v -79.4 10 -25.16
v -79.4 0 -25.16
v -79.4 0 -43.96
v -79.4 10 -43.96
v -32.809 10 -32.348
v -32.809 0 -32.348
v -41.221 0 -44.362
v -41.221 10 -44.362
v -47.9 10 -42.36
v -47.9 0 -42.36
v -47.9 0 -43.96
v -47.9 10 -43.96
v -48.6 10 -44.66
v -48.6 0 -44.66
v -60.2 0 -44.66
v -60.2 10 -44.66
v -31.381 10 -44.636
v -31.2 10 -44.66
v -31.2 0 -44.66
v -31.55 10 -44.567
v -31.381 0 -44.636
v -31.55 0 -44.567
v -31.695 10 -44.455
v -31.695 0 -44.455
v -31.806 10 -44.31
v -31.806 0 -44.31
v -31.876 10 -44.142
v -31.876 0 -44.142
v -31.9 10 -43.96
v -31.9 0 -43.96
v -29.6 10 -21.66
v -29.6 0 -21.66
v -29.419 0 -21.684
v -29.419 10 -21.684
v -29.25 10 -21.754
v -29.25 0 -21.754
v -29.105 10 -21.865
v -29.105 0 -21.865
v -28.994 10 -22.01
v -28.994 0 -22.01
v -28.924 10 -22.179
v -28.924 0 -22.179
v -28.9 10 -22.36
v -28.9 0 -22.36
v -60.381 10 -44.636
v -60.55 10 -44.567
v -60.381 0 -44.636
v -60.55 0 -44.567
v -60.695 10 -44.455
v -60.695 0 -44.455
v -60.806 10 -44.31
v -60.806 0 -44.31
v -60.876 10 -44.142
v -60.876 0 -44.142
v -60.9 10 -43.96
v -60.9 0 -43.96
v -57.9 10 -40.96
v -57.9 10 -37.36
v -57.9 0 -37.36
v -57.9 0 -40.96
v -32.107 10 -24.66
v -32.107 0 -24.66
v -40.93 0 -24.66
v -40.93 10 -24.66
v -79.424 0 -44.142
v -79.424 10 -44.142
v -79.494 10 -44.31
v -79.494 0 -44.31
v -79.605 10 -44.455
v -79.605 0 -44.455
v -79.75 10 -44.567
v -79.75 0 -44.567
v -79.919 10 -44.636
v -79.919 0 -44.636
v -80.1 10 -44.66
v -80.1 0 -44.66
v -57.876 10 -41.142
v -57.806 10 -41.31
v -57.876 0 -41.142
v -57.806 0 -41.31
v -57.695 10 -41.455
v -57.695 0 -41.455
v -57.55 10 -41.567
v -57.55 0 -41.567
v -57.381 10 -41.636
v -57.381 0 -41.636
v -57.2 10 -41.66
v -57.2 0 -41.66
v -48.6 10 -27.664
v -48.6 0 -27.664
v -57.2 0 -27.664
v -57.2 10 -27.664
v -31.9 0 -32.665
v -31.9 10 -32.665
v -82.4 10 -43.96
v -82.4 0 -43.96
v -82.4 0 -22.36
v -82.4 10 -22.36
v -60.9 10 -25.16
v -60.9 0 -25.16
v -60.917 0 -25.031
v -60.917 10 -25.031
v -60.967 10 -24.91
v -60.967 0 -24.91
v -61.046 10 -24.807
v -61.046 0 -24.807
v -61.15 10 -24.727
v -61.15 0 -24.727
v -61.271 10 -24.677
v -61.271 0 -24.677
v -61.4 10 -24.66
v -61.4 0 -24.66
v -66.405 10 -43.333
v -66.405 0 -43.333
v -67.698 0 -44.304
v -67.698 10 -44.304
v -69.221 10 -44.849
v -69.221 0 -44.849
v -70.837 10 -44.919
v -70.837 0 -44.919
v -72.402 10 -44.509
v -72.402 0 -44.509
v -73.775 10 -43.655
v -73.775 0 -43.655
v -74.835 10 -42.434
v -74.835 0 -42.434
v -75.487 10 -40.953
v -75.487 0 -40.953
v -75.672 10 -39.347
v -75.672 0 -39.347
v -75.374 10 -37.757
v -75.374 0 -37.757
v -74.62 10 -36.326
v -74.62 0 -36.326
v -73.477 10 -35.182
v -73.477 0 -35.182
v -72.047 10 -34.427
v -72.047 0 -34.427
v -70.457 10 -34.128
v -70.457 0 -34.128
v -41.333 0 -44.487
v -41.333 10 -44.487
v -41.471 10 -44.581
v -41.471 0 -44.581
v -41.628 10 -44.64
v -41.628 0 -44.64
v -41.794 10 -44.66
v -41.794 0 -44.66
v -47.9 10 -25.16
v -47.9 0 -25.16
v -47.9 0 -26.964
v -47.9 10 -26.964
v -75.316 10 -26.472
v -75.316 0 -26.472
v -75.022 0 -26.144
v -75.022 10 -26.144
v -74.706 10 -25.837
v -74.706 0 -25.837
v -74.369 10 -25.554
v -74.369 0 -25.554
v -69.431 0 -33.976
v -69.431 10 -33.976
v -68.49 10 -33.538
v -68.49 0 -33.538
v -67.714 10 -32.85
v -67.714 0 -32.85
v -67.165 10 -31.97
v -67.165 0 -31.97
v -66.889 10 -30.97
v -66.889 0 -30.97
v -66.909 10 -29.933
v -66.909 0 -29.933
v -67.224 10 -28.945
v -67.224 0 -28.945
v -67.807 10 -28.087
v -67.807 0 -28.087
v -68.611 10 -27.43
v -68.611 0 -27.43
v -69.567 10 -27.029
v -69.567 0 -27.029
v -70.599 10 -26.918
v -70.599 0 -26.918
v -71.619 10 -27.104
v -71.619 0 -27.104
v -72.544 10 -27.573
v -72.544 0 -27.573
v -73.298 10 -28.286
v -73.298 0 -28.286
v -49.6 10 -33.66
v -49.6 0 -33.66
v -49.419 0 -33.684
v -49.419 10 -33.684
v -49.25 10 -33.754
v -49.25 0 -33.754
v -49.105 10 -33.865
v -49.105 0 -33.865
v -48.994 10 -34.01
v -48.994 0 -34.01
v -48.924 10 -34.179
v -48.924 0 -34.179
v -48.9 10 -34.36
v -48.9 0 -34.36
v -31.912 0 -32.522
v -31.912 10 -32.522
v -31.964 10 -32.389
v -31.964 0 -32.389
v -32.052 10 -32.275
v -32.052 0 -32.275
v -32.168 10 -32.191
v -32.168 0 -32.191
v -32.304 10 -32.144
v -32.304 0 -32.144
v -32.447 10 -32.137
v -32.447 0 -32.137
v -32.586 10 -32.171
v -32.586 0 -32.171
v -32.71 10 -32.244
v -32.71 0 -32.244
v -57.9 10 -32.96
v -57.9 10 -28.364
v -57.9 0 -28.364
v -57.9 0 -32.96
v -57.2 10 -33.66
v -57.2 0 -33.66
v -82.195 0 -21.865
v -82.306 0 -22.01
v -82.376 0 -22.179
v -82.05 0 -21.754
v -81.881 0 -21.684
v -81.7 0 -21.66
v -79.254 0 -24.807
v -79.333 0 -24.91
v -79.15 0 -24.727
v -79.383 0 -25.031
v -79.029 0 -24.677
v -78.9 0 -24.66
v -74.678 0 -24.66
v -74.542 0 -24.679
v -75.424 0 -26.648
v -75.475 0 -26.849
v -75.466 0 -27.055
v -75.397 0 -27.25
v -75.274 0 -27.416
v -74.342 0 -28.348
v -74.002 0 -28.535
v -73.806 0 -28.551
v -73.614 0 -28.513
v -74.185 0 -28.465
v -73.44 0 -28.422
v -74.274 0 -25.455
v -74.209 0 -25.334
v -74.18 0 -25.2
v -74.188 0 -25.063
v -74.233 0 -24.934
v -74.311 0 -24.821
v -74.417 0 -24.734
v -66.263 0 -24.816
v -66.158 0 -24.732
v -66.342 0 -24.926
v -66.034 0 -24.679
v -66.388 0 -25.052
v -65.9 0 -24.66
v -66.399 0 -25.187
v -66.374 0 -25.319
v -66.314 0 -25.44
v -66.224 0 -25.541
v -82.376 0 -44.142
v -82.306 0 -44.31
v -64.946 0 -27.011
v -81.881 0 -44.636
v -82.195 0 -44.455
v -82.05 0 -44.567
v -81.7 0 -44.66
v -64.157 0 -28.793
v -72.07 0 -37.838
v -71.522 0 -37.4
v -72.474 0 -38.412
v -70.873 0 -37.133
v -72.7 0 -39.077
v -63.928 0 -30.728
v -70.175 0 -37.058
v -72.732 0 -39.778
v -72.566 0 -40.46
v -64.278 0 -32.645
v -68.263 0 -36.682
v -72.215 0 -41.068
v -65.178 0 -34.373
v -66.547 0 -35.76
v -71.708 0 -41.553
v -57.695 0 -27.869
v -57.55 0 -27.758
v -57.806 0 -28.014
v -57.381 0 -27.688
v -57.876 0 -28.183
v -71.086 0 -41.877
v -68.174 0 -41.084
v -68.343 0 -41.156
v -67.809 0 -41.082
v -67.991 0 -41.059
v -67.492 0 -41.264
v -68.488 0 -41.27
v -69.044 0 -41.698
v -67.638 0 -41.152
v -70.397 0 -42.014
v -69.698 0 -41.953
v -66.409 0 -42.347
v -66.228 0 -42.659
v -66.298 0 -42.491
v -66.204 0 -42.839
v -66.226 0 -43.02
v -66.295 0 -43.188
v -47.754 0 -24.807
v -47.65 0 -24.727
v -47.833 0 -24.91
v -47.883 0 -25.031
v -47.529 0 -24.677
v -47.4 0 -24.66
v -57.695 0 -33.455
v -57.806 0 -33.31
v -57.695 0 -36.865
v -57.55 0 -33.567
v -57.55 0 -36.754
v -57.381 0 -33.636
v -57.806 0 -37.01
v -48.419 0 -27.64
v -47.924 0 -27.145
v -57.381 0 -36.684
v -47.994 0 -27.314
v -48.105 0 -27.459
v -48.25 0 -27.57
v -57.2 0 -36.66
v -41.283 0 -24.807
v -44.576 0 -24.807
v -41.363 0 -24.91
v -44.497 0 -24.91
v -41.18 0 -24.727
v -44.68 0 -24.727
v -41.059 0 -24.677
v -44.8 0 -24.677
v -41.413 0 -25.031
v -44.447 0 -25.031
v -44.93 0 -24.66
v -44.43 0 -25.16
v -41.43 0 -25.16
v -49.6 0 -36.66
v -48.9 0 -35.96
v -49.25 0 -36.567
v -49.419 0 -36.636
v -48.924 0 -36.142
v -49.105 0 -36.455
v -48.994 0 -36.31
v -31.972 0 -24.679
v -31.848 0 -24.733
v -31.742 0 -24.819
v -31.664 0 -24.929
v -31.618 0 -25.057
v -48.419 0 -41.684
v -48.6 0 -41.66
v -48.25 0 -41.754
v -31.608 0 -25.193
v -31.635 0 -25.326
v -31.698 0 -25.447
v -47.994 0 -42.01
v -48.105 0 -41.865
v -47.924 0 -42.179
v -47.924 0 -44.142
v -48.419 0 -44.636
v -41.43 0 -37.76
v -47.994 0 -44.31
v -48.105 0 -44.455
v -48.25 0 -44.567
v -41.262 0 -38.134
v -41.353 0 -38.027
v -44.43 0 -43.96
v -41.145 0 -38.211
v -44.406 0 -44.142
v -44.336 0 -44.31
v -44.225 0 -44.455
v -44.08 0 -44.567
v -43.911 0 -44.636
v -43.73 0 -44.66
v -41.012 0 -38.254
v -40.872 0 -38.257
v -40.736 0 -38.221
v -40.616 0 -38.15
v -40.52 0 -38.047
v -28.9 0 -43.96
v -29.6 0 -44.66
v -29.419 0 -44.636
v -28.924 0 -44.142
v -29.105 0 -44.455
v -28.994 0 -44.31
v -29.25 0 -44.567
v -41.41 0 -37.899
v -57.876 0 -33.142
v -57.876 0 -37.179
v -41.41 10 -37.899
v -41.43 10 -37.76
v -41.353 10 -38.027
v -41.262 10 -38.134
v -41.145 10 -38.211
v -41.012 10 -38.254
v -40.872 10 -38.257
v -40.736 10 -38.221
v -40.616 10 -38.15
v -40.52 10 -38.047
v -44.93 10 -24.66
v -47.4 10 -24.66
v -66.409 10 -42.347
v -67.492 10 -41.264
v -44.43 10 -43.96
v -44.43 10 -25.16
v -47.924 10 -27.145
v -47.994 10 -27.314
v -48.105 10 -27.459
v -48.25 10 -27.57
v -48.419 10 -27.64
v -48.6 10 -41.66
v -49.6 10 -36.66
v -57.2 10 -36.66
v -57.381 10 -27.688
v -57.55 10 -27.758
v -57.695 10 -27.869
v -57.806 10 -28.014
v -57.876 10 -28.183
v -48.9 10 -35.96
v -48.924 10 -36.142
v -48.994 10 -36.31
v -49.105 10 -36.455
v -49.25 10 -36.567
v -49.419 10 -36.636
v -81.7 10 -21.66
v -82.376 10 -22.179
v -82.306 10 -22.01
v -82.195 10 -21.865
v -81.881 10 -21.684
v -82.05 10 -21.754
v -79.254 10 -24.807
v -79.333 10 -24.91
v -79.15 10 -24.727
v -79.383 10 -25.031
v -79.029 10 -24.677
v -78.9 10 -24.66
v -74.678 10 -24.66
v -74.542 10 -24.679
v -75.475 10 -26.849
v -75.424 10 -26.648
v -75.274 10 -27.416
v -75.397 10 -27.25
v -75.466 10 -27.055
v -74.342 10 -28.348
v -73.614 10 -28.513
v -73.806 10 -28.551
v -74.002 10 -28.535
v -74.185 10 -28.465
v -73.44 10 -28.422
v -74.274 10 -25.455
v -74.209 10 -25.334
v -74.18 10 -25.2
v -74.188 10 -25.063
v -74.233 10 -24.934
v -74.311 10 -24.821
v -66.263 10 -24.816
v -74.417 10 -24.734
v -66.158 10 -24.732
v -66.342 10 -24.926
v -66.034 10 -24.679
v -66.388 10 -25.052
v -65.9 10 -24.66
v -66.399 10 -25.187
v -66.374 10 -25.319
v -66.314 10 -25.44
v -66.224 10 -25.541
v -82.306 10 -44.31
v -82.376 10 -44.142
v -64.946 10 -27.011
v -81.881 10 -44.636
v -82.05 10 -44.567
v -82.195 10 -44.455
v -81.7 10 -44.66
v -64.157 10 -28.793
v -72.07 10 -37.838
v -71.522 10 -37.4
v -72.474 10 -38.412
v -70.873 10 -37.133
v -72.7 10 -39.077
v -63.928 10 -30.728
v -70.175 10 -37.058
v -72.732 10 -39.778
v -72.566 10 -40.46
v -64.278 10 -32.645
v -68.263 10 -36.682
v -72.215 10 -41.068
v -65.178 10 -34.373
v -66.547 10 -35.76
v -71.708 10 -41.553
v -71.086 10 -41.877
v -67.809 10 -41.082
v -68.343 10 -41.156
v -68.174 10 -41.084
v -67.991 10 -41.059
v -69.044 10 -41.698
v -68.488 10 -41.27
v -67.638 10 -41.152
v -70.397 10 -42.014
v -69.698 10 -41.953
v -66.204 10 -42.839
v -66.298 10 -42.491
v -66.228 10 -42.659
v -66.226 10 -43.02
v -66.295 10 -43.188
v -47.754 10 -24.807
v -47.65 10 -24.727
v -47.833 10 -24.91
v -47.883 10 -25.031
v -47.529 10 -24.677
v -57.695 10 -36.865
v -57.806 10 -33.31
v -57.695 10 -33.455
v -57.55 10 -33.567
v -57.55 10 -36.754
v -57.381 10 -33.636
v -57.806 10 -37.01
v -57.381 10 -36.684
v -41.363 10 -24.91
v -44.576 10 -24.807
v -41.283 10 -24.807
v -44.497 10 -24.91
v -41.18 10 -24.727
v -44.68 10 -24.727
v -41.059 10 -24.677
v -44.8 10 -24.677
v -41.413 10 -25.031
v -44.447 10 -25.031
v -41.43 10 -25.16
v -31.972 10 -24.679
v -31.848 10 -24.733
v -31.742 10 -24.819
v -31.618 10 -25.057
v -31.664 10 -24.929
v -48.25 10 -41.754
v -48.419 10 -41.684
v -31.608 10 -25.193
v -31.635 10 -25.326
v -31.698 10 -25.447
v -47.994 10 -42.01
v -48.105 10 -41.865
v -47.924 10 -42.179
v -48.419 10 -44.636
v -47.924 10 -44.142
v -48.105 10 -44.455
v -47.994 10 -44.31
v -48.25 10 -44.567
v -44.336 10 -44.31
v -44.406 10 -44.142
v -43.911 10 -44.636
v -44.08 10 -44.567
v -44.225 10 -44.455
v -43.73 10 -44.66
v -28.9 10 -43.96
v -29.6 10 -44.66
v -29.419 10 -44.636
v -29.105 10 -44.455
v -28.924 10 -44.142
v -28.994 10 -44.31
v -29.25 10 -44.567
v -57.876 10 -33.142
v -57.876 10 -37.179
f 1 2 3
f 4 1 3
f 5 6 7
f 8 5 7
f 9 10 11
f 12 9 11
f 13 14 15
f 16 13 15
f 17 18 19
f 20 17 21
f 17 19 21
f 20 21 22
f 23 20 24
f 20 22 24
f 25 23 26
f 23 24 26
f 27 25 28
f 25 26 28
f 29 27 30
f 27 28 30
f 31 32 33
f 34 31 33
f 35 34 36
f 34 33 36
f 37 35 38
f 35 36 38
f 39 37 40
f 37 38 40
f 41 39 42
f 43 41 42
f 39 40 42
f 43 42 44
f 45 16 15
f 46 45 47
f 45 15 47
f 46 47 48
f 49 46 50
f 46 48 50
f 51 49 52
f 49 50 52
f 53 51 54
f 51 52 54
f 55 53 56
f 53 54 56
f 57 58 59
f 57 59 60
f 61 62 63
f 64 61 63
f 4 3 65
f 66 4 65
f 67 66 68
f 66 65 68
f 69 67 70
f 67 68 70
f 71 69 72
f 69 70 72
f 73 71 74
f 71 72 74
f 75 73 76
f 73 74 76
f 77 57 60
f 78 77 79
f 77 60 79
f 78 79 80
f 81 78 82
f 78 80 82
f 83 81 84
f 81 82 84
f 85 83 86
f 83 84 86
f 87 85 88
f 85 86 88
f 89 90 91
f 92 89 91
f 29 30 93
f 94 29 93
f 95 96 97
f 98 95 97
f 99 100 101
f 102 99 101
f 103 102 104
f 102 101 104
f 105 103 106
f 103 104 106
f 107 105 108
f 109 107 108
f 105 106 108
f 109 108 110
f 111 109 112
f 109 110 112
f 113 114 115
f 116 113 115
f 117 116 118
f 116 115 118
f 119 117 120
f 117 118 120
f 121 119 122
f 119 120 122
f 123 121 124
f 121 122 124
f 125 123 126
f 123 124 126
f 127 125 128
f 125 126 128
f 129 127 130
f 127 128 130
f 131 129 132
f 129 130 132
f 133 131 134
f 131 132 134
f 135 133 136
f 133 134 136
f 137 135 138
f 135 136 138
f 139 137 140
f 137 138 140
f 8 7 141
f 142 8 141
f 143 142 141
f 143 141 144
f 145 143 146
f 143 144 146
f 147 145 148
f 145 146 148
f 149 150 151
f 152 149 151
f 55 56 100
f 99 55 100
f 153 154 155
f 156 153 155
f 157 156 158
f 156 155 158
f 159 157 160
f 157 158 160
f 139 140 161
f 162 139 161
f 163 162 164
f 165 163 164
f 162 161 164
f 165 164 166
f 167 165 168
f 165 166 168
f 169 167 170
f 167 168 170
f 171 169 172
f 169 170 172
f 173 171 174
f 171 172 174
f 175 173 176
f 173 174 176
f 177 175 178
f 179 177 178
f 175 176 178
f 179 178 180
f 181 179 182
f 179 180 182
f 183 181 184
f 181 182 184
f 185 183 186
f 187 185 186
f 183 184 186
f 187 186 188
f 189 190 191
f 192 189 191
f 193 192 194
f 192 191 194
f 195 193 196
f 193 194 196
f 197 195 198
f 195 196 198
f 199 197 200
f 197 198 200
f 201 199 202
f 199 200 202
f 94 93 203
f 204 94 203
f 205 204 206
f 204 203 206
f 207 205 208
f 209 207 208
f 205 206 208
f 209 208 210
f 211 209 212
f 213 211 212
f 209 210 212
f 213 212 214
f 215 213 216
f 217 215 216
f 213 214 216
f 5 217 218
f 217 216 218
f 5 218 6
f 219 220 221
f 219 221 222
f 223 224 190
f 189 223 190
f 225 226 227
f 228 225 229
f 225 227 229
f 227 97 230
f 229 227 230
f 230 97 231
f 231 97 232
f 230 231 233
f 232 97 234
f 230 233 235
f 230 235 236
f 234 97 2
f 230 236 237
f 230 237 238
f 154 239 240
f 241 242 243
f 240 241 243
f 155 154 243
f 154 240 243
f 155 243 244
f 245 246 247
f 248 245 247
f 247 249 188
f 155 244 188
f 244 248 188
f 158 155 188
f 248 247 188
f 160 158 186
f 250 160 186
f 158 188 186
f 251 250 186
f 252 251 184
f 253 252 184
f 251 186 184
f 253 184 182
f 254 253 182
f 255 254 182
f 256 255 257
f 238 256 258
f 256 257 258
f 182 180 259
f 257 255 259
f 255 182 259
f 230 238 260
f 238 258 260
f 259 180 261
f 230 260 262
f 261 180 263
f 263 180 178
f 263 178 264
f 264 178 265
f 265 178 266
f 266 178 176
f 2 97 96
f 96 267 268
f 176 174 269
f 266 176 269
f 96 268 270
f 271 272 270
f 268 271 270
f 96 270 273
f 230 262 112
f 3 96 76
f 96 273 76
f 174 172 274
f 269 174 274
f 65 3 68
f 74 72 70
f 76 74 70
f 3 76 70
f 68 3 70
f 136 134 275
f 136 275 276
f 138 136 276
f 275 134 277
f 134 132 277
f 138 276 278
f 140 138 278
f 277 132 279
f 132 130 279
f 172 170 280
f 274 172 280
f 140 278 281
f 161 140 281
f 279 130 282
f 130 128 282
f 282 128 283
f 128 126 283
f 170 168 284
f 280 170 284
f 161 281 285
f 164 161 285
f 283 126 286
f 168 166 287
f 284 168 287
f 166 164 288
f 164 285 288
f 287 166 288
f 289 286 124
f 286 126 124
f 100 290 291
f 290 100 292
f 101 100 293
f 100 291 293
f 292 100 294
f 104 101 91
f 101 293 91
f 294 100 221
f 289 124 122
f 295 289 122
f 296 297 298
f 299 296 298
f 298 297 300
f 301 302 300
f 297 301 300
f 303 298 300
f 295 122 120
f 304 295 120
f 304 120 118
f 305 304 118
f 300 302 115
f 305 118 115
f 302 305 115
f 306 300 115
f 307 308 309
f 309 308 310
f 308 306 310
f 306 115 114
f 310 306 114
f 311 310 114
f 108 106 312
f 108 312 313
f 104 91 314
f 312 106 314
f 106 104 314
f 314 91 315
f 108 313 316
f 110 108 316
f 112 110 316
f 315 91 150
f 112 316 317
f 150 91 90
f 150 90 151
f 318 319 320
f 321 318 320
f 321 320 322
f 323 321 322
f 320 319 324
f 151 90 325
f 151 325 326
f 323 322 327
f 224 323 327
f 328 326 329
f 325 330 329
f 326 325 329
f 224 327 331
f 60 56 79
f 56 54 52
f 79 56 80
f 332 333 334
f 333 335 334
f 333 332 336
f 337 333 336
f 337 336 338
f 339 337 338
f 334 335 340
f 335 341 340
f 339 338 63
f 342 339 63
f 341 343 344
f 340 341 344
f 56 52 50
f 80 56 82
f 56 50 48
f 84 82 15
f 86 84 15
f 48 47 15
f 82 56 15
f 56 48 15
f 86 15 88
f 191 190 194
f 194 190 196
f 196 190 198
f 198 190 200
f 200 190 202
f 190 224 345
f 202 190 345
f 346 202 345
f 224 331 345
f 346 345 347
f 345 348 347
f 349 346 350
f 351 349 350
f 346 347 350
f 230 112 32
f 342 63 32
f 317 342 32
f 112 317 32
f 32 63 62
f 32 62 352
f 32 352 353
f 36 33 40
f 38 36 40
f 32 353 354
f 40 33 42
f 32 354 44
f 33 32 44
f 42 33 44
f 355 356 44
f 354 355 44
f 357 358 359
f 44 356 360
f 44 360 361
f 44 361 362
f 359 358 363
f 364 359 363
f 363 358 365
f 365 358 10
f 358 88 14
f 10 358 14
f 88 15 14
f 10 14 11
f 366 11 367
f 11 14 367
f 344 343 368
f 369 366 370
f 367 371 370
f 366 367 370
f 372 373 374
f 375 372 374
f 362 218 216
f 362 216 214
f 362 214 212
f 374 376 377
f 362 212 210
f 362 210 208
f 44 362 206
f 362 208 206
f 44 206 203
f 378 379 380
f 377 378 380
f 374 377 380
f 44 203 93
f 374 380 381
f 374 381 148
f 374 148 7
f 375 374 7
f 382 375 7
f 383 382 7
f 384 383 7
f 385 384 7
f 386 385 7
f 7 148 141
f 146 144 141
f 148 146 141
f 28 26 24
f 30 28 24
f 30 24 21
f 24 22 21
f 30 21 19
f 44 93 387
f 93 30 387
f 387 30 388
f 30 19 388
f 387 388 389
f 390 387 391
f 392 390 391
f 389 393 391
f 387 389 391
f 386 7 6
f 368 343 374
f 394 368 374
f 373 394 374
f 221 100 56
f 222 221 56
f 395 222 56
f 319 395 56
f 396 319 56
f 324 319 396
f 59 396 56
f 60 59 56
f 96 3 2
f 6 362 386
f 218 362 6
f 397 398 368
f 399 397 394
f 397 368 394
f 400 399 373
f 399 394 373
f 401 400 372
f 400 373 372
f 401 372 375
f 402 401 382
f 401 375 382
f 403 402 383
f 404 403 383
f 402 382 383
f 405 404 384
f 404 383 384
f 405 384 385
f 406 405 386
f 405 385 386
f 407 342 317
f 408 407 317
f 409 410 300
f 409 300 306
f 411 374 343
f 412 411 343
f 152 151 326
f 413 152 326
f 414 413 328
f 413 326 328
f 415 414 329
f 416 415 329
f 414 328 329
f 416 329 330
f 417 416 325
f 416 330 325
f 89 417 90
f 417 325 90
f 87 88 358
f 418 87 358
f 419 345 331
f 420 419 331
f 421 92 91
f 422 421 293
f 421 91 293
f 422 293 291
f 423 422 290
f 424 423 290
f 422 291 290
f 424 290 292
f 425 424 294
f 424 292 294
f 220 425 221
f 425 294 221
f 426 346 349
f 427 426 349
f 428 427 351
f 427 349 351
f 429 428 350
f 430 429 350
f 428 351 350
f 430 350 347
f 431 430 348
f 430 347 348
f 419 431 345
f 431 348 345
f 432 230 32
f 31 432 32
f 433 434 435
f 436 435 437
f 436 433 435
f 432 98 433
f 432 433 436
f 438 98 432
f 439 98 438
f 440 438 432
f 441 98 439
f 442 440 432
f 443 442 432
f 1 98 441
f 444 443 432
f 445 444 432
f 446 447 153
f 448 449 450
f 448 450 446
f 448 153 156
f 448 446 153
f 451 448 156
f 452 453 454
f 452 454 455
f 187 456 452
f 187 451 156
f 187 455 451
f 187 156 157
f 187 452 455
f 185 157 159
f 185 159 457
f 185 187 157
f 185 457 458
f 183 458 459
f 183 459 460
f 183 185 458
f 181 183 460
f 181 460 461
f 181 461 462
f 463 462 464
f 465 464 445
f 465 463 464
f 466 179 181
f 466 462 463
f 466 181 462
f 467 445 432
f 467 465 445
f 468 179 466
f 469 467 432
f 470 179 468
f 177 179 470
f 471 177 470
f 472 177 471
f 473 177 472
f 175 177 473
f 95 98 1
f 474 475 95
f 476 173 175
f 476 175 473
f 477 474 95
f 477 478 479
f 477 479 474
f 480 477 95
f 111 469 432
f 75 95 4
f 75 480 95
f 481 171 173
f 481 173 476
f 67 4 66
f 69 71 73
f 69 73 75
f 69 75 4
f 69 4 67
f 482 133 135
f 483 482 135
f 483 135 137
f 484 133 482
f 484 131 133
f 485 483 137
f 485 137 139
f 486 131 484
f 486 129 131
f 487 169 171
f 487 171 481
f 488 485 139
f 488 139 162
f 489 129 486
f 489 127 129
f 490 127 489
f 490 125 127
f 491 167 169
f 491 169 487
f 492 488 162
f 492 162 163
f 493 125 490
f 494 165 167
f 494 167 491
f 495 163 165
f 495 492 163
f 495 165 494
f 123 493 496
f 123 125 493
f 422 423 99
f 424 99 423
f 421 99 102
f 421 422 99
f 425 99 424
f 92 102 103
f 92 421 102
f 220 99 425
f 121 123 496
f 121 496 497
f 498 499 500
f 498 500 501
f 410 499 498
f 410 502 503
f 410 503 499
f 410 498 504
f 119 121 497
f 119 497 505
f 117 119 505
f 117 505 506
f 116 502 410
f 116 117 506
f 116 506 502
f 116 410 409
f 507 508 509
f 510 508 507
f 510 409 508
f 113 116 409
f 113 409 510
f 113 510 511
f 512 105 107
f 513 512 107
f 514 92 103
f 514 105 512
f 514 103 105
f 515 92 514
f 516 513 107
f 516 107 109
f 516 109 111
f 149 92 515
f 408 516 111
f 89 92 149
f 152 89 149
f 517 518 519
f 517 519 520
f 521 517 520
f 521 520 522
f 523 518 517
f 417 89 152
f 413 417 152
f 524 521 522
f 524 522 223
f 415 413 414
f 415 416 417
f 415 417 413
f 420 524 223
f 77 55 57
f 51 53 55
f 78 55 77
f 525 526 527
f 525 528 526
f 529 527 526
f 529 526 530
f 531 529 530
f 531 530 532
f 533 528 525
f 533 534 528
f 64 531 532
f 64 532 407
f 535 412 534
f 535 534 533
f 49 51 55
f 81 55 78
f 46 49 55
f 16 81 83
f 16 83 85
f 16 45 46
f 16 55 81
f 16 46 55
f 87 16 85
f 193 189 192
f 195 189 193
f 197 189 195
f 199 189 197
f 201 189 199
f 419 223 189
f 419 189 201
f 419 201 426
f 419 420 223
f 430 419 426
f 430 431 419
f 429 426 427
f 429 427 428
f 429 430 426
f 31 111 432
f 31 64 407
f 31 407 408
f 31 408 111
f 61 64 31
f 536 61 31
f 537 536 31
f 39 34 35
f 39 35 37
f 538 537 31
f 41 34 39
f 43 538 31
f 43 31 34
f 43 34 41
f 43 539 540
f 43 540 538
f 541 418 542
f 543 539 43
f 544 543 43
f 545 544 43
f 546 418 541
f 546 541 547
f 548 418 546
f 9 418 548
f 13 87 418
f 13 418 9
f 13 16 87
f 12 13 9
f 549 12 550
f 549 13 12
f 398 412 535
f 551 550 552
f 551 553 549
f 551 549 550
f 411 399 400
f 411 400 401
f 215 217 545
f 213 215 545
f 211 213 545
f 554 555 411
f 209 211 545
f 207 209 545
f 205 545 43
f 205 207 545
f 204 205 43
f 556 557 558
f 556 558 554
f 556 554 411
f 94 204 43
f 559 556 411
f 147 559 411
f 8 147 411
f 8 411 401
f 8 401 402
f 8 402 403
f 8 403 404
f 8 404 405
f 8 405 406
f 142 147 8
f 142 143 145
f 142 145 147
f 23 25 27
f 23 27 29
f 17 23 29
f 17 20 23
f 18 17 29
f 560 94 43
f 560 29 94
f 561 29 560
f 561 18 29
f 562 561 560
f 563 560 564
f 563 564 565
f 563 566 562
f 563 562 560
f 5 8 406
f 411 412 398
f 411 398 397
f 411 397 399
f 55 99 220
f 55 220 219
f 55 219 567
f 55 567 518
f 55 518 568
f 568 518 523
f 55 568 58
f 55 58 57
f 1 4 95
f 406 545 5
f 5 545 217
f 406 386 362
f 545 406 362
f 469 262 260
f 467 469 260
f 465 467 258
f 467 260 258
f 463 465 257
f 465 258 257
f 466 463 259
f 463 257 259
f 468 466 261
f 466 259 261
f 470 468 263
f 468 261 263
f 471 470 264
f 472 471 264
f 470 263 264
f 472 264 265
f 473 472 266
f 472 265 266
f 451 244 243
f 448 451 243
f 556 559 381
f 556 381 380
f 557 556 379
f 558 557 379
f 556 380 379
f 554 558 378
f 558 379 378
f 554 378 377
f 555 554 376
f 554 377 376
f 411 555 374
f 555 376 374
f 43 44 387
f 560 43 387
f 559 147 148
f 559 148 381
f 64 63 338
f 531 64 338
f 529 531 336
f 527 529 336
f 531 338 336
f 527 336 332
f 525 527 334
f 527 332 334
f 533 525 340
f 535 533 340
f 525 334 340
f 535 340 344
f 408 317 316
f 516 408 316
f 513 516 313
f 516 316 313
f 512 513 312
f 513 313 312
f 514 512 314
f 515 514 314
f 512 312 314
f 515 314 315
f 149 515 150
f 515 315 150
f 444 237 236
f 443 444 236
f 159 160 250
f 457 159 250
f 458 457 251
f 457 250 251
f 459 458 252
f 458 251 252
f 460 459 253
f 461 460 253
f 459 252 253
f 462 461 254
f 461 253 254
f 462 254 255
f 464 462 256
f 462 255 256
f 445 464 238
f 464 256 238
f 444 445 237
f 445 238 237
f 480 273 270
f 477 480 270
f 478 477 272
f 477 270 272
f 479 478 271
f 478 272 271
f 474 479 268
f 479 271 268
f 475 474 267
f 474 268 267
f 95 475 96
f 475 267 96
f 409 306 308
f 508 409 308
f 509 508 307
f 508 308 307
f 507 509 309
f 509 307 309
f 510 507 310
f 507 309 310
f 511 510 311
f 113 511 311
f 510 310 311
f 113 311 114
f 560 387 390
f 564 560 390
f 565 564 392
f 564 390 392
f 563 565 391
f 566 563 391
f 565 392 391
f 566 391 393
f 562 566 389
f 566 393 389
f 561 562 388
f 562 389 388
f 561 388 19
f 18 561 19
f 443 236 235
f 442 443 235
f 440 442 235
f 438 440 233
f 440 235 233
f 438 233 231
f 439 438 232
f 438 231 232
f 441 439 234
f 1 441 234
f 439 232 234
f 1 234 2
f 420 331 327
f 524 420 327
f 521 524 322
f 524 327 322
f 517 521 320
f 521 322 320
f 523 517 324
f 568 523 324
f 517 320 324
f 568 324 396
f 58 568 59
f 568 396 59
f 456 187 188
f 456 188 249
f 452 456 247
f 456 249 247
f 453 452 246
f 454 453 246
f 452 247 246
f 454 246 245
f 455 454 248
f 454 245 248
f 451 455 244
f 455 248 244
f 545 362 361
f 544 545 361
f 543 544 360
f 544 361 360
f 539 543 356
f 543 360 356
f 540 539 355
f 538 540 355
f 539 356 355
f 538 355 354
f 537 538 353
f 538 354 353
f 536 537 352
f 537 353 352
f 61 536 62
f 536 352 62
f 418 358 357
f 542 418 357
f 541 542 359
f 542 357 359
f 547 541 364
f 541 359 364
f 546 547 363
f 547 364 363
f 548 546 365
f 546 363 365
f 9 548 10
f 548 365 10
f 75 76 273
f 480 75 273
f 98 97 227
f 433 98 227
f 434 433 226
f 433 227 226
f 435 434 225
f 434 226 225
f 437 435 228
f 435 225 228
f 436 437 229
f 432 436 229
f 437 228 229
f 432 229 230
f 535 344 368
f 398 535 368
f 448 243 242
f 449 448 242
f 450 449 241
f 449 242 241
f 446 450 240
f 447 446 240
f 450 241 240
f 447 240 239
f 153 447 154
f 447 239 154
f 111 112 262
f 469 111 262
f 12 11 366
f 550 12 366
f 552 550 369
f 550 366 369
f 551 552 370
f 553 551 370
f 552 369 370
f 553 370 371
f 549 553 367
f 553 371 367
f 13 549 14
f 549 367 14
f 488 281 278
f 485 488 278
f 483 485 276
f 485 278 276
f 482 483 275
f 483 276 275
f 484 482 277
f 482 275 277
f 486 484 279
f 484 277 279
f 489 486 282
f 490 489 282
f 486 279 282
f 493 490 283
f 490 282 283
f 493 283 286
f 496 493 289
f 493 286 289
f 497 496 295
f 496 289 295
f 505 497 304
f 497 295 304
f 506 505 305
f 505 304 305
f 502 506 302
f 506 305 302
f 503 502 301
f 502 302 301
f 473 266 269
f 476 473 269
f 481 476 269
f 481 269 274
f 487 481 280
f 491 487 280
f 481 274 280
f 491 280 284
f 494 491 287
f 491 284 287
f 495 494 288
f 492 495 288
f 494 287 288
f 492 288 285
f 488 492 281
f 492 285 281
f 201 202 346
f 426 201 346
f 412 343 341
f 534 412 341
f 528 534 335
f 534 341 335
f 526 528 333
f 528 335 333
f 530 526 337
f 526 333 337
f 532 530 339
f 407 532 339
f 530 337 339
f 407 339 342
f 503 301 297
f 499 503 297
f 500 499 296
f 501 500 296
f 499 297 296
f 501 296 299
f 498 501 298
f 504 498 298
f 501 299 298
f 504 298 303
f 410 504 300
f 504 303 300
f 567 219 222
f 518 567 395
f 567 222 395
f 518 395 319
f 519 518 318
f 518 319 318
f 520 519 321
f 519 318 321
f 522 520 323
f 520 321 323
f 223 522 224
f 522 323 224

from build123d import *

# Parameters (mm, degrees)
BOSS_EXTRU_1_DEPTH = 10


with BuildPart() as part:
    # Esquisse3 → Boss.-Extru.1 (new body)
    with BuildSketch(Plane(origin=(0, 0, 0), x_dir=(1, 0, 0), z_dir=(0, 1, 0))):
        with BuildLine():
            Line((-82.4, 43.960350299), (-82.4, 24.660350299))
            Line((-82.4, 24.660350299), (-82.4, 22.360350299))
            ThreePointArc((-82.4, 22.360350299), (-82.194974747, 21.865375552), (-81.7, 21.660350299))
            Line((-81.7, 21.660350299), (-29.6, 21.660350299))
            ThreePointArc((-29.6, 21.660350299), (-29.105025253, 21.865375552), (-28.9, 22.360350299))
            Line((-28.9, 22.360350299), (-28.9, 24.660350299))
            Line((-28.9, 24.660350299), (-28.9, 43.960350299))
            ThreePointArc((-28.9, 43.960350299), (-29.105025253, 44.455325045), (-29.6, 44.660350299))
            Line((-29.6, 44.660350299), (-31.2, 44.660350299))
            ThreePointArc((-31.2, 44.660350299), (-31.694974747, 44.455325045), (-31.9, 43.960350299))
            Line((-31.9, 43.960350299), (-31.9, 32.665451753))
            ThreePointArc((-31.9, 32.665451753), (-32.234265531, 32.16295091), (-32.808648392, 32.348220639))
            Line((-32.808648392, 32.348220639), (-41.220684895, 44.361853804))
            ThreePointArc((-41.220684895, 44.361853804), (-41.470867297, 44.581257882), (-41.794091326, 44.660350299))
            Line((-41.794091326, 44.660350299), (-43.729694391, 44.660350299))
            ThreePointArc((-43.729694391, 44.660350299), (-44.224669138, 44.455325045), (-44.429694391, 43.960350299))
            Line((-44.429694391, 43.960350299), (-44.429694391, 25.160350299))
            ThreePointArc((-44.429694391, 25.160350299), (-44.576141, 24.806796908), (-44.929694391, 24.660350299))
            Line((-44.929694391, 24.660350299), (-47.4, 24.660350299))
            ThreePointArc((-47.4, 24.660350299), (-47.753553391, 24.806796908), (-47.9, 25.160350299))
            Line((-47.9, 25.160350299), (-47.9, 26.96406145))
            ThreePointArc((-47.9, 26.96406145), (-48.105025253, 27.459036196), (-48.6, 27.66406145))
            Line((-48.6, 27.66406145), (-57.2, 27.66406145))
            ThreePointArc((-57.2, 27.66406145), (-57.694974747, 27.869086703), (-57.9, 28.36406145))
            Line((-57.9, 28.36406145), (-57.9, 32.960350299))
            ThreePointArc((-57.9, 32.960350299), (-57.694974747, 33.455325045), (-57.2, 33.660350299))
            Line((-57.2, 33.660350299), (-49.6, 33.660350299))
            ThreePointArc((-49.6, 33.660350299), (-49.105025253, 33.865375552), (-48.9, 34.360350299))
            Line((-48.9, 34.360350299), (-48.9, 35.960350299))
            ThreePointArc((-48.9, 35.960350299), (-49.105025253, 36.455325045), (-49.6, 36.660350299))
            Line((-49.6, 36.660350299), (-57.2, 36.660350299))
            ThreePointArc((-57.2, 36.660350299), (-57.694974747, 36.865375552), (-57.9, 37.360350299))
            Line((-57.9, 37.360350299), (-57.9, 40.960350299))
            ThreePointArc((-57.9, 40.960350299), (-57.694974747, 41.455325045), (-57.2, 41.660350299))
            Line((-57.2, 41.660350299), (-48.6, 41.660350299))
            ThreePointArc((-48.6, 41.660350299), (-48.105025253, 41.865375552), (-47.9, 42.360350299))
            Line((-47.9, 42.360350299), (-47.9, 43.960350299))
            ThreePointArc((-47.9, 43.960350299), (-48.105025253, 44.455325045), (-48.6, 44.660350299))
            Line((-48.6, 44.660350299), (-60.2, 44.660350299))
            ThreePointArc((-60.2, 44.660350299), (-60.694974747, 44.455325045), (-60.9, 43.960350299))
            Line((-60.9, 43.960350299), (-60.9, 25.160350299))
            ThreePointArc((-60.9, 25.160350299), (-61.046446609, 24.806796908), (-61.4, 24.660350299))
            Line((-61.4, 24.660350299), (-65.9, 24.660350299))
            ThreePointArc((-65.9, 24.660350299), (-66.369202757, 24.987582324), (-66.224252839, 25.540955207))
            ThreePointArc((-66.224252839, 25.540955207), (-64.278360769, 32.64470583), (-70.174954097, 37.058316142))
            ThreePointArc((-70.174954097, 37.058316142), (-72.565676109, 40.459645131), (-68.487924516, 41.269912109))
            ThreePointArc((-68.487924516, 41.269912109), (-67.991231434, 41.058872606), (-67.492020465, 41.26388504))
            Line((-67.492020465, 41.26388504), (-66.408605494, 42.347300011))
            ThreePointArc((-66.408605494, 42.347300011), (-66.203586079, 42.839415787), (-66.404578845, 43.333189829))
            ThreePointArc((-66.404578845, 43.333189829), (-75.216844977, 41.718134484), (-70.456992958, 34.128124806))
            ThreePointArc((-70.456992958, 34.128124806), (-67.224229351, 28.944517523), (-73.29773035, 28.286390935))
            ThreePointArc((-73.29773035, 28.286390935), (-73.806166505, 28.551332862), (-74.342034946, 28.347503126))
            Line((-74.342034946, 28.347503126), (-75.273738539, 27.415799533))
            ThreePointArc((-75.273738539, 27.415799533), (-75.478062353, 26.95215404), (-75.316017422, 26.472094871))
            ThreePointArc((-75.316017422, 26.472094871), (-74.866763267, 25.988060793), (-74.369432688, 25.55357192))
            ThreePointArc((-74.369432688, 25.55357192), (-74.205711949, 24.996965493), (-74.678263963, 24.660350299))
            Line((-74.678263963, 24.660350299), (-78.9, 24.660350299))
            ThreePointArc((-78.9, 24.660350299), (-79.253553391, 24.806796908), (-79.4, 25.160350299))
            Line((-79.4, 25.160350299), (-79.4, 43.960350299))
            ThreePointArc((-79.4, 43.960350299), (-79.605025253, 44.455325045), (-80.1, 44.660350299))
            Line((-80.1, 44.660350299), (-81.7, 44.660350299))
            ThreePointArc((-81.7, 44.660350299), (-82.194974747, 44.455325045), (-82.4, 43.960350299))
        make_face()
        with BuildLine():
            Line((-41.429694391, 25.160350299), (-41.429694391, 37.760350299))
            ThreePointArc((-41.429694391, 37.760350299), (-41.08004729, 38.237208774), (-40.520118369, 38.047138517))
            Line((-40.520118369, 38.047138517), (-31.697503387, 25.447138517))
            ThreePointArc((-31.697503387, 25.447138517), (-31.663573993, 24.929475992), (-32.107079409, 24.660350299))
            Line((-32.107079409, 24.660350299), (-40.929694391, 24.660350299))
            ThreePointArc((-40.929694391, 24.660350299), (-41.283247781, 24.806796908), (-41.429694391, 25.160350299))
        make_face(mode=Mode.SUBTRACT)
    extrude(amount=BOSS_EXTRU_1_DEPTH)


solid = part.part
